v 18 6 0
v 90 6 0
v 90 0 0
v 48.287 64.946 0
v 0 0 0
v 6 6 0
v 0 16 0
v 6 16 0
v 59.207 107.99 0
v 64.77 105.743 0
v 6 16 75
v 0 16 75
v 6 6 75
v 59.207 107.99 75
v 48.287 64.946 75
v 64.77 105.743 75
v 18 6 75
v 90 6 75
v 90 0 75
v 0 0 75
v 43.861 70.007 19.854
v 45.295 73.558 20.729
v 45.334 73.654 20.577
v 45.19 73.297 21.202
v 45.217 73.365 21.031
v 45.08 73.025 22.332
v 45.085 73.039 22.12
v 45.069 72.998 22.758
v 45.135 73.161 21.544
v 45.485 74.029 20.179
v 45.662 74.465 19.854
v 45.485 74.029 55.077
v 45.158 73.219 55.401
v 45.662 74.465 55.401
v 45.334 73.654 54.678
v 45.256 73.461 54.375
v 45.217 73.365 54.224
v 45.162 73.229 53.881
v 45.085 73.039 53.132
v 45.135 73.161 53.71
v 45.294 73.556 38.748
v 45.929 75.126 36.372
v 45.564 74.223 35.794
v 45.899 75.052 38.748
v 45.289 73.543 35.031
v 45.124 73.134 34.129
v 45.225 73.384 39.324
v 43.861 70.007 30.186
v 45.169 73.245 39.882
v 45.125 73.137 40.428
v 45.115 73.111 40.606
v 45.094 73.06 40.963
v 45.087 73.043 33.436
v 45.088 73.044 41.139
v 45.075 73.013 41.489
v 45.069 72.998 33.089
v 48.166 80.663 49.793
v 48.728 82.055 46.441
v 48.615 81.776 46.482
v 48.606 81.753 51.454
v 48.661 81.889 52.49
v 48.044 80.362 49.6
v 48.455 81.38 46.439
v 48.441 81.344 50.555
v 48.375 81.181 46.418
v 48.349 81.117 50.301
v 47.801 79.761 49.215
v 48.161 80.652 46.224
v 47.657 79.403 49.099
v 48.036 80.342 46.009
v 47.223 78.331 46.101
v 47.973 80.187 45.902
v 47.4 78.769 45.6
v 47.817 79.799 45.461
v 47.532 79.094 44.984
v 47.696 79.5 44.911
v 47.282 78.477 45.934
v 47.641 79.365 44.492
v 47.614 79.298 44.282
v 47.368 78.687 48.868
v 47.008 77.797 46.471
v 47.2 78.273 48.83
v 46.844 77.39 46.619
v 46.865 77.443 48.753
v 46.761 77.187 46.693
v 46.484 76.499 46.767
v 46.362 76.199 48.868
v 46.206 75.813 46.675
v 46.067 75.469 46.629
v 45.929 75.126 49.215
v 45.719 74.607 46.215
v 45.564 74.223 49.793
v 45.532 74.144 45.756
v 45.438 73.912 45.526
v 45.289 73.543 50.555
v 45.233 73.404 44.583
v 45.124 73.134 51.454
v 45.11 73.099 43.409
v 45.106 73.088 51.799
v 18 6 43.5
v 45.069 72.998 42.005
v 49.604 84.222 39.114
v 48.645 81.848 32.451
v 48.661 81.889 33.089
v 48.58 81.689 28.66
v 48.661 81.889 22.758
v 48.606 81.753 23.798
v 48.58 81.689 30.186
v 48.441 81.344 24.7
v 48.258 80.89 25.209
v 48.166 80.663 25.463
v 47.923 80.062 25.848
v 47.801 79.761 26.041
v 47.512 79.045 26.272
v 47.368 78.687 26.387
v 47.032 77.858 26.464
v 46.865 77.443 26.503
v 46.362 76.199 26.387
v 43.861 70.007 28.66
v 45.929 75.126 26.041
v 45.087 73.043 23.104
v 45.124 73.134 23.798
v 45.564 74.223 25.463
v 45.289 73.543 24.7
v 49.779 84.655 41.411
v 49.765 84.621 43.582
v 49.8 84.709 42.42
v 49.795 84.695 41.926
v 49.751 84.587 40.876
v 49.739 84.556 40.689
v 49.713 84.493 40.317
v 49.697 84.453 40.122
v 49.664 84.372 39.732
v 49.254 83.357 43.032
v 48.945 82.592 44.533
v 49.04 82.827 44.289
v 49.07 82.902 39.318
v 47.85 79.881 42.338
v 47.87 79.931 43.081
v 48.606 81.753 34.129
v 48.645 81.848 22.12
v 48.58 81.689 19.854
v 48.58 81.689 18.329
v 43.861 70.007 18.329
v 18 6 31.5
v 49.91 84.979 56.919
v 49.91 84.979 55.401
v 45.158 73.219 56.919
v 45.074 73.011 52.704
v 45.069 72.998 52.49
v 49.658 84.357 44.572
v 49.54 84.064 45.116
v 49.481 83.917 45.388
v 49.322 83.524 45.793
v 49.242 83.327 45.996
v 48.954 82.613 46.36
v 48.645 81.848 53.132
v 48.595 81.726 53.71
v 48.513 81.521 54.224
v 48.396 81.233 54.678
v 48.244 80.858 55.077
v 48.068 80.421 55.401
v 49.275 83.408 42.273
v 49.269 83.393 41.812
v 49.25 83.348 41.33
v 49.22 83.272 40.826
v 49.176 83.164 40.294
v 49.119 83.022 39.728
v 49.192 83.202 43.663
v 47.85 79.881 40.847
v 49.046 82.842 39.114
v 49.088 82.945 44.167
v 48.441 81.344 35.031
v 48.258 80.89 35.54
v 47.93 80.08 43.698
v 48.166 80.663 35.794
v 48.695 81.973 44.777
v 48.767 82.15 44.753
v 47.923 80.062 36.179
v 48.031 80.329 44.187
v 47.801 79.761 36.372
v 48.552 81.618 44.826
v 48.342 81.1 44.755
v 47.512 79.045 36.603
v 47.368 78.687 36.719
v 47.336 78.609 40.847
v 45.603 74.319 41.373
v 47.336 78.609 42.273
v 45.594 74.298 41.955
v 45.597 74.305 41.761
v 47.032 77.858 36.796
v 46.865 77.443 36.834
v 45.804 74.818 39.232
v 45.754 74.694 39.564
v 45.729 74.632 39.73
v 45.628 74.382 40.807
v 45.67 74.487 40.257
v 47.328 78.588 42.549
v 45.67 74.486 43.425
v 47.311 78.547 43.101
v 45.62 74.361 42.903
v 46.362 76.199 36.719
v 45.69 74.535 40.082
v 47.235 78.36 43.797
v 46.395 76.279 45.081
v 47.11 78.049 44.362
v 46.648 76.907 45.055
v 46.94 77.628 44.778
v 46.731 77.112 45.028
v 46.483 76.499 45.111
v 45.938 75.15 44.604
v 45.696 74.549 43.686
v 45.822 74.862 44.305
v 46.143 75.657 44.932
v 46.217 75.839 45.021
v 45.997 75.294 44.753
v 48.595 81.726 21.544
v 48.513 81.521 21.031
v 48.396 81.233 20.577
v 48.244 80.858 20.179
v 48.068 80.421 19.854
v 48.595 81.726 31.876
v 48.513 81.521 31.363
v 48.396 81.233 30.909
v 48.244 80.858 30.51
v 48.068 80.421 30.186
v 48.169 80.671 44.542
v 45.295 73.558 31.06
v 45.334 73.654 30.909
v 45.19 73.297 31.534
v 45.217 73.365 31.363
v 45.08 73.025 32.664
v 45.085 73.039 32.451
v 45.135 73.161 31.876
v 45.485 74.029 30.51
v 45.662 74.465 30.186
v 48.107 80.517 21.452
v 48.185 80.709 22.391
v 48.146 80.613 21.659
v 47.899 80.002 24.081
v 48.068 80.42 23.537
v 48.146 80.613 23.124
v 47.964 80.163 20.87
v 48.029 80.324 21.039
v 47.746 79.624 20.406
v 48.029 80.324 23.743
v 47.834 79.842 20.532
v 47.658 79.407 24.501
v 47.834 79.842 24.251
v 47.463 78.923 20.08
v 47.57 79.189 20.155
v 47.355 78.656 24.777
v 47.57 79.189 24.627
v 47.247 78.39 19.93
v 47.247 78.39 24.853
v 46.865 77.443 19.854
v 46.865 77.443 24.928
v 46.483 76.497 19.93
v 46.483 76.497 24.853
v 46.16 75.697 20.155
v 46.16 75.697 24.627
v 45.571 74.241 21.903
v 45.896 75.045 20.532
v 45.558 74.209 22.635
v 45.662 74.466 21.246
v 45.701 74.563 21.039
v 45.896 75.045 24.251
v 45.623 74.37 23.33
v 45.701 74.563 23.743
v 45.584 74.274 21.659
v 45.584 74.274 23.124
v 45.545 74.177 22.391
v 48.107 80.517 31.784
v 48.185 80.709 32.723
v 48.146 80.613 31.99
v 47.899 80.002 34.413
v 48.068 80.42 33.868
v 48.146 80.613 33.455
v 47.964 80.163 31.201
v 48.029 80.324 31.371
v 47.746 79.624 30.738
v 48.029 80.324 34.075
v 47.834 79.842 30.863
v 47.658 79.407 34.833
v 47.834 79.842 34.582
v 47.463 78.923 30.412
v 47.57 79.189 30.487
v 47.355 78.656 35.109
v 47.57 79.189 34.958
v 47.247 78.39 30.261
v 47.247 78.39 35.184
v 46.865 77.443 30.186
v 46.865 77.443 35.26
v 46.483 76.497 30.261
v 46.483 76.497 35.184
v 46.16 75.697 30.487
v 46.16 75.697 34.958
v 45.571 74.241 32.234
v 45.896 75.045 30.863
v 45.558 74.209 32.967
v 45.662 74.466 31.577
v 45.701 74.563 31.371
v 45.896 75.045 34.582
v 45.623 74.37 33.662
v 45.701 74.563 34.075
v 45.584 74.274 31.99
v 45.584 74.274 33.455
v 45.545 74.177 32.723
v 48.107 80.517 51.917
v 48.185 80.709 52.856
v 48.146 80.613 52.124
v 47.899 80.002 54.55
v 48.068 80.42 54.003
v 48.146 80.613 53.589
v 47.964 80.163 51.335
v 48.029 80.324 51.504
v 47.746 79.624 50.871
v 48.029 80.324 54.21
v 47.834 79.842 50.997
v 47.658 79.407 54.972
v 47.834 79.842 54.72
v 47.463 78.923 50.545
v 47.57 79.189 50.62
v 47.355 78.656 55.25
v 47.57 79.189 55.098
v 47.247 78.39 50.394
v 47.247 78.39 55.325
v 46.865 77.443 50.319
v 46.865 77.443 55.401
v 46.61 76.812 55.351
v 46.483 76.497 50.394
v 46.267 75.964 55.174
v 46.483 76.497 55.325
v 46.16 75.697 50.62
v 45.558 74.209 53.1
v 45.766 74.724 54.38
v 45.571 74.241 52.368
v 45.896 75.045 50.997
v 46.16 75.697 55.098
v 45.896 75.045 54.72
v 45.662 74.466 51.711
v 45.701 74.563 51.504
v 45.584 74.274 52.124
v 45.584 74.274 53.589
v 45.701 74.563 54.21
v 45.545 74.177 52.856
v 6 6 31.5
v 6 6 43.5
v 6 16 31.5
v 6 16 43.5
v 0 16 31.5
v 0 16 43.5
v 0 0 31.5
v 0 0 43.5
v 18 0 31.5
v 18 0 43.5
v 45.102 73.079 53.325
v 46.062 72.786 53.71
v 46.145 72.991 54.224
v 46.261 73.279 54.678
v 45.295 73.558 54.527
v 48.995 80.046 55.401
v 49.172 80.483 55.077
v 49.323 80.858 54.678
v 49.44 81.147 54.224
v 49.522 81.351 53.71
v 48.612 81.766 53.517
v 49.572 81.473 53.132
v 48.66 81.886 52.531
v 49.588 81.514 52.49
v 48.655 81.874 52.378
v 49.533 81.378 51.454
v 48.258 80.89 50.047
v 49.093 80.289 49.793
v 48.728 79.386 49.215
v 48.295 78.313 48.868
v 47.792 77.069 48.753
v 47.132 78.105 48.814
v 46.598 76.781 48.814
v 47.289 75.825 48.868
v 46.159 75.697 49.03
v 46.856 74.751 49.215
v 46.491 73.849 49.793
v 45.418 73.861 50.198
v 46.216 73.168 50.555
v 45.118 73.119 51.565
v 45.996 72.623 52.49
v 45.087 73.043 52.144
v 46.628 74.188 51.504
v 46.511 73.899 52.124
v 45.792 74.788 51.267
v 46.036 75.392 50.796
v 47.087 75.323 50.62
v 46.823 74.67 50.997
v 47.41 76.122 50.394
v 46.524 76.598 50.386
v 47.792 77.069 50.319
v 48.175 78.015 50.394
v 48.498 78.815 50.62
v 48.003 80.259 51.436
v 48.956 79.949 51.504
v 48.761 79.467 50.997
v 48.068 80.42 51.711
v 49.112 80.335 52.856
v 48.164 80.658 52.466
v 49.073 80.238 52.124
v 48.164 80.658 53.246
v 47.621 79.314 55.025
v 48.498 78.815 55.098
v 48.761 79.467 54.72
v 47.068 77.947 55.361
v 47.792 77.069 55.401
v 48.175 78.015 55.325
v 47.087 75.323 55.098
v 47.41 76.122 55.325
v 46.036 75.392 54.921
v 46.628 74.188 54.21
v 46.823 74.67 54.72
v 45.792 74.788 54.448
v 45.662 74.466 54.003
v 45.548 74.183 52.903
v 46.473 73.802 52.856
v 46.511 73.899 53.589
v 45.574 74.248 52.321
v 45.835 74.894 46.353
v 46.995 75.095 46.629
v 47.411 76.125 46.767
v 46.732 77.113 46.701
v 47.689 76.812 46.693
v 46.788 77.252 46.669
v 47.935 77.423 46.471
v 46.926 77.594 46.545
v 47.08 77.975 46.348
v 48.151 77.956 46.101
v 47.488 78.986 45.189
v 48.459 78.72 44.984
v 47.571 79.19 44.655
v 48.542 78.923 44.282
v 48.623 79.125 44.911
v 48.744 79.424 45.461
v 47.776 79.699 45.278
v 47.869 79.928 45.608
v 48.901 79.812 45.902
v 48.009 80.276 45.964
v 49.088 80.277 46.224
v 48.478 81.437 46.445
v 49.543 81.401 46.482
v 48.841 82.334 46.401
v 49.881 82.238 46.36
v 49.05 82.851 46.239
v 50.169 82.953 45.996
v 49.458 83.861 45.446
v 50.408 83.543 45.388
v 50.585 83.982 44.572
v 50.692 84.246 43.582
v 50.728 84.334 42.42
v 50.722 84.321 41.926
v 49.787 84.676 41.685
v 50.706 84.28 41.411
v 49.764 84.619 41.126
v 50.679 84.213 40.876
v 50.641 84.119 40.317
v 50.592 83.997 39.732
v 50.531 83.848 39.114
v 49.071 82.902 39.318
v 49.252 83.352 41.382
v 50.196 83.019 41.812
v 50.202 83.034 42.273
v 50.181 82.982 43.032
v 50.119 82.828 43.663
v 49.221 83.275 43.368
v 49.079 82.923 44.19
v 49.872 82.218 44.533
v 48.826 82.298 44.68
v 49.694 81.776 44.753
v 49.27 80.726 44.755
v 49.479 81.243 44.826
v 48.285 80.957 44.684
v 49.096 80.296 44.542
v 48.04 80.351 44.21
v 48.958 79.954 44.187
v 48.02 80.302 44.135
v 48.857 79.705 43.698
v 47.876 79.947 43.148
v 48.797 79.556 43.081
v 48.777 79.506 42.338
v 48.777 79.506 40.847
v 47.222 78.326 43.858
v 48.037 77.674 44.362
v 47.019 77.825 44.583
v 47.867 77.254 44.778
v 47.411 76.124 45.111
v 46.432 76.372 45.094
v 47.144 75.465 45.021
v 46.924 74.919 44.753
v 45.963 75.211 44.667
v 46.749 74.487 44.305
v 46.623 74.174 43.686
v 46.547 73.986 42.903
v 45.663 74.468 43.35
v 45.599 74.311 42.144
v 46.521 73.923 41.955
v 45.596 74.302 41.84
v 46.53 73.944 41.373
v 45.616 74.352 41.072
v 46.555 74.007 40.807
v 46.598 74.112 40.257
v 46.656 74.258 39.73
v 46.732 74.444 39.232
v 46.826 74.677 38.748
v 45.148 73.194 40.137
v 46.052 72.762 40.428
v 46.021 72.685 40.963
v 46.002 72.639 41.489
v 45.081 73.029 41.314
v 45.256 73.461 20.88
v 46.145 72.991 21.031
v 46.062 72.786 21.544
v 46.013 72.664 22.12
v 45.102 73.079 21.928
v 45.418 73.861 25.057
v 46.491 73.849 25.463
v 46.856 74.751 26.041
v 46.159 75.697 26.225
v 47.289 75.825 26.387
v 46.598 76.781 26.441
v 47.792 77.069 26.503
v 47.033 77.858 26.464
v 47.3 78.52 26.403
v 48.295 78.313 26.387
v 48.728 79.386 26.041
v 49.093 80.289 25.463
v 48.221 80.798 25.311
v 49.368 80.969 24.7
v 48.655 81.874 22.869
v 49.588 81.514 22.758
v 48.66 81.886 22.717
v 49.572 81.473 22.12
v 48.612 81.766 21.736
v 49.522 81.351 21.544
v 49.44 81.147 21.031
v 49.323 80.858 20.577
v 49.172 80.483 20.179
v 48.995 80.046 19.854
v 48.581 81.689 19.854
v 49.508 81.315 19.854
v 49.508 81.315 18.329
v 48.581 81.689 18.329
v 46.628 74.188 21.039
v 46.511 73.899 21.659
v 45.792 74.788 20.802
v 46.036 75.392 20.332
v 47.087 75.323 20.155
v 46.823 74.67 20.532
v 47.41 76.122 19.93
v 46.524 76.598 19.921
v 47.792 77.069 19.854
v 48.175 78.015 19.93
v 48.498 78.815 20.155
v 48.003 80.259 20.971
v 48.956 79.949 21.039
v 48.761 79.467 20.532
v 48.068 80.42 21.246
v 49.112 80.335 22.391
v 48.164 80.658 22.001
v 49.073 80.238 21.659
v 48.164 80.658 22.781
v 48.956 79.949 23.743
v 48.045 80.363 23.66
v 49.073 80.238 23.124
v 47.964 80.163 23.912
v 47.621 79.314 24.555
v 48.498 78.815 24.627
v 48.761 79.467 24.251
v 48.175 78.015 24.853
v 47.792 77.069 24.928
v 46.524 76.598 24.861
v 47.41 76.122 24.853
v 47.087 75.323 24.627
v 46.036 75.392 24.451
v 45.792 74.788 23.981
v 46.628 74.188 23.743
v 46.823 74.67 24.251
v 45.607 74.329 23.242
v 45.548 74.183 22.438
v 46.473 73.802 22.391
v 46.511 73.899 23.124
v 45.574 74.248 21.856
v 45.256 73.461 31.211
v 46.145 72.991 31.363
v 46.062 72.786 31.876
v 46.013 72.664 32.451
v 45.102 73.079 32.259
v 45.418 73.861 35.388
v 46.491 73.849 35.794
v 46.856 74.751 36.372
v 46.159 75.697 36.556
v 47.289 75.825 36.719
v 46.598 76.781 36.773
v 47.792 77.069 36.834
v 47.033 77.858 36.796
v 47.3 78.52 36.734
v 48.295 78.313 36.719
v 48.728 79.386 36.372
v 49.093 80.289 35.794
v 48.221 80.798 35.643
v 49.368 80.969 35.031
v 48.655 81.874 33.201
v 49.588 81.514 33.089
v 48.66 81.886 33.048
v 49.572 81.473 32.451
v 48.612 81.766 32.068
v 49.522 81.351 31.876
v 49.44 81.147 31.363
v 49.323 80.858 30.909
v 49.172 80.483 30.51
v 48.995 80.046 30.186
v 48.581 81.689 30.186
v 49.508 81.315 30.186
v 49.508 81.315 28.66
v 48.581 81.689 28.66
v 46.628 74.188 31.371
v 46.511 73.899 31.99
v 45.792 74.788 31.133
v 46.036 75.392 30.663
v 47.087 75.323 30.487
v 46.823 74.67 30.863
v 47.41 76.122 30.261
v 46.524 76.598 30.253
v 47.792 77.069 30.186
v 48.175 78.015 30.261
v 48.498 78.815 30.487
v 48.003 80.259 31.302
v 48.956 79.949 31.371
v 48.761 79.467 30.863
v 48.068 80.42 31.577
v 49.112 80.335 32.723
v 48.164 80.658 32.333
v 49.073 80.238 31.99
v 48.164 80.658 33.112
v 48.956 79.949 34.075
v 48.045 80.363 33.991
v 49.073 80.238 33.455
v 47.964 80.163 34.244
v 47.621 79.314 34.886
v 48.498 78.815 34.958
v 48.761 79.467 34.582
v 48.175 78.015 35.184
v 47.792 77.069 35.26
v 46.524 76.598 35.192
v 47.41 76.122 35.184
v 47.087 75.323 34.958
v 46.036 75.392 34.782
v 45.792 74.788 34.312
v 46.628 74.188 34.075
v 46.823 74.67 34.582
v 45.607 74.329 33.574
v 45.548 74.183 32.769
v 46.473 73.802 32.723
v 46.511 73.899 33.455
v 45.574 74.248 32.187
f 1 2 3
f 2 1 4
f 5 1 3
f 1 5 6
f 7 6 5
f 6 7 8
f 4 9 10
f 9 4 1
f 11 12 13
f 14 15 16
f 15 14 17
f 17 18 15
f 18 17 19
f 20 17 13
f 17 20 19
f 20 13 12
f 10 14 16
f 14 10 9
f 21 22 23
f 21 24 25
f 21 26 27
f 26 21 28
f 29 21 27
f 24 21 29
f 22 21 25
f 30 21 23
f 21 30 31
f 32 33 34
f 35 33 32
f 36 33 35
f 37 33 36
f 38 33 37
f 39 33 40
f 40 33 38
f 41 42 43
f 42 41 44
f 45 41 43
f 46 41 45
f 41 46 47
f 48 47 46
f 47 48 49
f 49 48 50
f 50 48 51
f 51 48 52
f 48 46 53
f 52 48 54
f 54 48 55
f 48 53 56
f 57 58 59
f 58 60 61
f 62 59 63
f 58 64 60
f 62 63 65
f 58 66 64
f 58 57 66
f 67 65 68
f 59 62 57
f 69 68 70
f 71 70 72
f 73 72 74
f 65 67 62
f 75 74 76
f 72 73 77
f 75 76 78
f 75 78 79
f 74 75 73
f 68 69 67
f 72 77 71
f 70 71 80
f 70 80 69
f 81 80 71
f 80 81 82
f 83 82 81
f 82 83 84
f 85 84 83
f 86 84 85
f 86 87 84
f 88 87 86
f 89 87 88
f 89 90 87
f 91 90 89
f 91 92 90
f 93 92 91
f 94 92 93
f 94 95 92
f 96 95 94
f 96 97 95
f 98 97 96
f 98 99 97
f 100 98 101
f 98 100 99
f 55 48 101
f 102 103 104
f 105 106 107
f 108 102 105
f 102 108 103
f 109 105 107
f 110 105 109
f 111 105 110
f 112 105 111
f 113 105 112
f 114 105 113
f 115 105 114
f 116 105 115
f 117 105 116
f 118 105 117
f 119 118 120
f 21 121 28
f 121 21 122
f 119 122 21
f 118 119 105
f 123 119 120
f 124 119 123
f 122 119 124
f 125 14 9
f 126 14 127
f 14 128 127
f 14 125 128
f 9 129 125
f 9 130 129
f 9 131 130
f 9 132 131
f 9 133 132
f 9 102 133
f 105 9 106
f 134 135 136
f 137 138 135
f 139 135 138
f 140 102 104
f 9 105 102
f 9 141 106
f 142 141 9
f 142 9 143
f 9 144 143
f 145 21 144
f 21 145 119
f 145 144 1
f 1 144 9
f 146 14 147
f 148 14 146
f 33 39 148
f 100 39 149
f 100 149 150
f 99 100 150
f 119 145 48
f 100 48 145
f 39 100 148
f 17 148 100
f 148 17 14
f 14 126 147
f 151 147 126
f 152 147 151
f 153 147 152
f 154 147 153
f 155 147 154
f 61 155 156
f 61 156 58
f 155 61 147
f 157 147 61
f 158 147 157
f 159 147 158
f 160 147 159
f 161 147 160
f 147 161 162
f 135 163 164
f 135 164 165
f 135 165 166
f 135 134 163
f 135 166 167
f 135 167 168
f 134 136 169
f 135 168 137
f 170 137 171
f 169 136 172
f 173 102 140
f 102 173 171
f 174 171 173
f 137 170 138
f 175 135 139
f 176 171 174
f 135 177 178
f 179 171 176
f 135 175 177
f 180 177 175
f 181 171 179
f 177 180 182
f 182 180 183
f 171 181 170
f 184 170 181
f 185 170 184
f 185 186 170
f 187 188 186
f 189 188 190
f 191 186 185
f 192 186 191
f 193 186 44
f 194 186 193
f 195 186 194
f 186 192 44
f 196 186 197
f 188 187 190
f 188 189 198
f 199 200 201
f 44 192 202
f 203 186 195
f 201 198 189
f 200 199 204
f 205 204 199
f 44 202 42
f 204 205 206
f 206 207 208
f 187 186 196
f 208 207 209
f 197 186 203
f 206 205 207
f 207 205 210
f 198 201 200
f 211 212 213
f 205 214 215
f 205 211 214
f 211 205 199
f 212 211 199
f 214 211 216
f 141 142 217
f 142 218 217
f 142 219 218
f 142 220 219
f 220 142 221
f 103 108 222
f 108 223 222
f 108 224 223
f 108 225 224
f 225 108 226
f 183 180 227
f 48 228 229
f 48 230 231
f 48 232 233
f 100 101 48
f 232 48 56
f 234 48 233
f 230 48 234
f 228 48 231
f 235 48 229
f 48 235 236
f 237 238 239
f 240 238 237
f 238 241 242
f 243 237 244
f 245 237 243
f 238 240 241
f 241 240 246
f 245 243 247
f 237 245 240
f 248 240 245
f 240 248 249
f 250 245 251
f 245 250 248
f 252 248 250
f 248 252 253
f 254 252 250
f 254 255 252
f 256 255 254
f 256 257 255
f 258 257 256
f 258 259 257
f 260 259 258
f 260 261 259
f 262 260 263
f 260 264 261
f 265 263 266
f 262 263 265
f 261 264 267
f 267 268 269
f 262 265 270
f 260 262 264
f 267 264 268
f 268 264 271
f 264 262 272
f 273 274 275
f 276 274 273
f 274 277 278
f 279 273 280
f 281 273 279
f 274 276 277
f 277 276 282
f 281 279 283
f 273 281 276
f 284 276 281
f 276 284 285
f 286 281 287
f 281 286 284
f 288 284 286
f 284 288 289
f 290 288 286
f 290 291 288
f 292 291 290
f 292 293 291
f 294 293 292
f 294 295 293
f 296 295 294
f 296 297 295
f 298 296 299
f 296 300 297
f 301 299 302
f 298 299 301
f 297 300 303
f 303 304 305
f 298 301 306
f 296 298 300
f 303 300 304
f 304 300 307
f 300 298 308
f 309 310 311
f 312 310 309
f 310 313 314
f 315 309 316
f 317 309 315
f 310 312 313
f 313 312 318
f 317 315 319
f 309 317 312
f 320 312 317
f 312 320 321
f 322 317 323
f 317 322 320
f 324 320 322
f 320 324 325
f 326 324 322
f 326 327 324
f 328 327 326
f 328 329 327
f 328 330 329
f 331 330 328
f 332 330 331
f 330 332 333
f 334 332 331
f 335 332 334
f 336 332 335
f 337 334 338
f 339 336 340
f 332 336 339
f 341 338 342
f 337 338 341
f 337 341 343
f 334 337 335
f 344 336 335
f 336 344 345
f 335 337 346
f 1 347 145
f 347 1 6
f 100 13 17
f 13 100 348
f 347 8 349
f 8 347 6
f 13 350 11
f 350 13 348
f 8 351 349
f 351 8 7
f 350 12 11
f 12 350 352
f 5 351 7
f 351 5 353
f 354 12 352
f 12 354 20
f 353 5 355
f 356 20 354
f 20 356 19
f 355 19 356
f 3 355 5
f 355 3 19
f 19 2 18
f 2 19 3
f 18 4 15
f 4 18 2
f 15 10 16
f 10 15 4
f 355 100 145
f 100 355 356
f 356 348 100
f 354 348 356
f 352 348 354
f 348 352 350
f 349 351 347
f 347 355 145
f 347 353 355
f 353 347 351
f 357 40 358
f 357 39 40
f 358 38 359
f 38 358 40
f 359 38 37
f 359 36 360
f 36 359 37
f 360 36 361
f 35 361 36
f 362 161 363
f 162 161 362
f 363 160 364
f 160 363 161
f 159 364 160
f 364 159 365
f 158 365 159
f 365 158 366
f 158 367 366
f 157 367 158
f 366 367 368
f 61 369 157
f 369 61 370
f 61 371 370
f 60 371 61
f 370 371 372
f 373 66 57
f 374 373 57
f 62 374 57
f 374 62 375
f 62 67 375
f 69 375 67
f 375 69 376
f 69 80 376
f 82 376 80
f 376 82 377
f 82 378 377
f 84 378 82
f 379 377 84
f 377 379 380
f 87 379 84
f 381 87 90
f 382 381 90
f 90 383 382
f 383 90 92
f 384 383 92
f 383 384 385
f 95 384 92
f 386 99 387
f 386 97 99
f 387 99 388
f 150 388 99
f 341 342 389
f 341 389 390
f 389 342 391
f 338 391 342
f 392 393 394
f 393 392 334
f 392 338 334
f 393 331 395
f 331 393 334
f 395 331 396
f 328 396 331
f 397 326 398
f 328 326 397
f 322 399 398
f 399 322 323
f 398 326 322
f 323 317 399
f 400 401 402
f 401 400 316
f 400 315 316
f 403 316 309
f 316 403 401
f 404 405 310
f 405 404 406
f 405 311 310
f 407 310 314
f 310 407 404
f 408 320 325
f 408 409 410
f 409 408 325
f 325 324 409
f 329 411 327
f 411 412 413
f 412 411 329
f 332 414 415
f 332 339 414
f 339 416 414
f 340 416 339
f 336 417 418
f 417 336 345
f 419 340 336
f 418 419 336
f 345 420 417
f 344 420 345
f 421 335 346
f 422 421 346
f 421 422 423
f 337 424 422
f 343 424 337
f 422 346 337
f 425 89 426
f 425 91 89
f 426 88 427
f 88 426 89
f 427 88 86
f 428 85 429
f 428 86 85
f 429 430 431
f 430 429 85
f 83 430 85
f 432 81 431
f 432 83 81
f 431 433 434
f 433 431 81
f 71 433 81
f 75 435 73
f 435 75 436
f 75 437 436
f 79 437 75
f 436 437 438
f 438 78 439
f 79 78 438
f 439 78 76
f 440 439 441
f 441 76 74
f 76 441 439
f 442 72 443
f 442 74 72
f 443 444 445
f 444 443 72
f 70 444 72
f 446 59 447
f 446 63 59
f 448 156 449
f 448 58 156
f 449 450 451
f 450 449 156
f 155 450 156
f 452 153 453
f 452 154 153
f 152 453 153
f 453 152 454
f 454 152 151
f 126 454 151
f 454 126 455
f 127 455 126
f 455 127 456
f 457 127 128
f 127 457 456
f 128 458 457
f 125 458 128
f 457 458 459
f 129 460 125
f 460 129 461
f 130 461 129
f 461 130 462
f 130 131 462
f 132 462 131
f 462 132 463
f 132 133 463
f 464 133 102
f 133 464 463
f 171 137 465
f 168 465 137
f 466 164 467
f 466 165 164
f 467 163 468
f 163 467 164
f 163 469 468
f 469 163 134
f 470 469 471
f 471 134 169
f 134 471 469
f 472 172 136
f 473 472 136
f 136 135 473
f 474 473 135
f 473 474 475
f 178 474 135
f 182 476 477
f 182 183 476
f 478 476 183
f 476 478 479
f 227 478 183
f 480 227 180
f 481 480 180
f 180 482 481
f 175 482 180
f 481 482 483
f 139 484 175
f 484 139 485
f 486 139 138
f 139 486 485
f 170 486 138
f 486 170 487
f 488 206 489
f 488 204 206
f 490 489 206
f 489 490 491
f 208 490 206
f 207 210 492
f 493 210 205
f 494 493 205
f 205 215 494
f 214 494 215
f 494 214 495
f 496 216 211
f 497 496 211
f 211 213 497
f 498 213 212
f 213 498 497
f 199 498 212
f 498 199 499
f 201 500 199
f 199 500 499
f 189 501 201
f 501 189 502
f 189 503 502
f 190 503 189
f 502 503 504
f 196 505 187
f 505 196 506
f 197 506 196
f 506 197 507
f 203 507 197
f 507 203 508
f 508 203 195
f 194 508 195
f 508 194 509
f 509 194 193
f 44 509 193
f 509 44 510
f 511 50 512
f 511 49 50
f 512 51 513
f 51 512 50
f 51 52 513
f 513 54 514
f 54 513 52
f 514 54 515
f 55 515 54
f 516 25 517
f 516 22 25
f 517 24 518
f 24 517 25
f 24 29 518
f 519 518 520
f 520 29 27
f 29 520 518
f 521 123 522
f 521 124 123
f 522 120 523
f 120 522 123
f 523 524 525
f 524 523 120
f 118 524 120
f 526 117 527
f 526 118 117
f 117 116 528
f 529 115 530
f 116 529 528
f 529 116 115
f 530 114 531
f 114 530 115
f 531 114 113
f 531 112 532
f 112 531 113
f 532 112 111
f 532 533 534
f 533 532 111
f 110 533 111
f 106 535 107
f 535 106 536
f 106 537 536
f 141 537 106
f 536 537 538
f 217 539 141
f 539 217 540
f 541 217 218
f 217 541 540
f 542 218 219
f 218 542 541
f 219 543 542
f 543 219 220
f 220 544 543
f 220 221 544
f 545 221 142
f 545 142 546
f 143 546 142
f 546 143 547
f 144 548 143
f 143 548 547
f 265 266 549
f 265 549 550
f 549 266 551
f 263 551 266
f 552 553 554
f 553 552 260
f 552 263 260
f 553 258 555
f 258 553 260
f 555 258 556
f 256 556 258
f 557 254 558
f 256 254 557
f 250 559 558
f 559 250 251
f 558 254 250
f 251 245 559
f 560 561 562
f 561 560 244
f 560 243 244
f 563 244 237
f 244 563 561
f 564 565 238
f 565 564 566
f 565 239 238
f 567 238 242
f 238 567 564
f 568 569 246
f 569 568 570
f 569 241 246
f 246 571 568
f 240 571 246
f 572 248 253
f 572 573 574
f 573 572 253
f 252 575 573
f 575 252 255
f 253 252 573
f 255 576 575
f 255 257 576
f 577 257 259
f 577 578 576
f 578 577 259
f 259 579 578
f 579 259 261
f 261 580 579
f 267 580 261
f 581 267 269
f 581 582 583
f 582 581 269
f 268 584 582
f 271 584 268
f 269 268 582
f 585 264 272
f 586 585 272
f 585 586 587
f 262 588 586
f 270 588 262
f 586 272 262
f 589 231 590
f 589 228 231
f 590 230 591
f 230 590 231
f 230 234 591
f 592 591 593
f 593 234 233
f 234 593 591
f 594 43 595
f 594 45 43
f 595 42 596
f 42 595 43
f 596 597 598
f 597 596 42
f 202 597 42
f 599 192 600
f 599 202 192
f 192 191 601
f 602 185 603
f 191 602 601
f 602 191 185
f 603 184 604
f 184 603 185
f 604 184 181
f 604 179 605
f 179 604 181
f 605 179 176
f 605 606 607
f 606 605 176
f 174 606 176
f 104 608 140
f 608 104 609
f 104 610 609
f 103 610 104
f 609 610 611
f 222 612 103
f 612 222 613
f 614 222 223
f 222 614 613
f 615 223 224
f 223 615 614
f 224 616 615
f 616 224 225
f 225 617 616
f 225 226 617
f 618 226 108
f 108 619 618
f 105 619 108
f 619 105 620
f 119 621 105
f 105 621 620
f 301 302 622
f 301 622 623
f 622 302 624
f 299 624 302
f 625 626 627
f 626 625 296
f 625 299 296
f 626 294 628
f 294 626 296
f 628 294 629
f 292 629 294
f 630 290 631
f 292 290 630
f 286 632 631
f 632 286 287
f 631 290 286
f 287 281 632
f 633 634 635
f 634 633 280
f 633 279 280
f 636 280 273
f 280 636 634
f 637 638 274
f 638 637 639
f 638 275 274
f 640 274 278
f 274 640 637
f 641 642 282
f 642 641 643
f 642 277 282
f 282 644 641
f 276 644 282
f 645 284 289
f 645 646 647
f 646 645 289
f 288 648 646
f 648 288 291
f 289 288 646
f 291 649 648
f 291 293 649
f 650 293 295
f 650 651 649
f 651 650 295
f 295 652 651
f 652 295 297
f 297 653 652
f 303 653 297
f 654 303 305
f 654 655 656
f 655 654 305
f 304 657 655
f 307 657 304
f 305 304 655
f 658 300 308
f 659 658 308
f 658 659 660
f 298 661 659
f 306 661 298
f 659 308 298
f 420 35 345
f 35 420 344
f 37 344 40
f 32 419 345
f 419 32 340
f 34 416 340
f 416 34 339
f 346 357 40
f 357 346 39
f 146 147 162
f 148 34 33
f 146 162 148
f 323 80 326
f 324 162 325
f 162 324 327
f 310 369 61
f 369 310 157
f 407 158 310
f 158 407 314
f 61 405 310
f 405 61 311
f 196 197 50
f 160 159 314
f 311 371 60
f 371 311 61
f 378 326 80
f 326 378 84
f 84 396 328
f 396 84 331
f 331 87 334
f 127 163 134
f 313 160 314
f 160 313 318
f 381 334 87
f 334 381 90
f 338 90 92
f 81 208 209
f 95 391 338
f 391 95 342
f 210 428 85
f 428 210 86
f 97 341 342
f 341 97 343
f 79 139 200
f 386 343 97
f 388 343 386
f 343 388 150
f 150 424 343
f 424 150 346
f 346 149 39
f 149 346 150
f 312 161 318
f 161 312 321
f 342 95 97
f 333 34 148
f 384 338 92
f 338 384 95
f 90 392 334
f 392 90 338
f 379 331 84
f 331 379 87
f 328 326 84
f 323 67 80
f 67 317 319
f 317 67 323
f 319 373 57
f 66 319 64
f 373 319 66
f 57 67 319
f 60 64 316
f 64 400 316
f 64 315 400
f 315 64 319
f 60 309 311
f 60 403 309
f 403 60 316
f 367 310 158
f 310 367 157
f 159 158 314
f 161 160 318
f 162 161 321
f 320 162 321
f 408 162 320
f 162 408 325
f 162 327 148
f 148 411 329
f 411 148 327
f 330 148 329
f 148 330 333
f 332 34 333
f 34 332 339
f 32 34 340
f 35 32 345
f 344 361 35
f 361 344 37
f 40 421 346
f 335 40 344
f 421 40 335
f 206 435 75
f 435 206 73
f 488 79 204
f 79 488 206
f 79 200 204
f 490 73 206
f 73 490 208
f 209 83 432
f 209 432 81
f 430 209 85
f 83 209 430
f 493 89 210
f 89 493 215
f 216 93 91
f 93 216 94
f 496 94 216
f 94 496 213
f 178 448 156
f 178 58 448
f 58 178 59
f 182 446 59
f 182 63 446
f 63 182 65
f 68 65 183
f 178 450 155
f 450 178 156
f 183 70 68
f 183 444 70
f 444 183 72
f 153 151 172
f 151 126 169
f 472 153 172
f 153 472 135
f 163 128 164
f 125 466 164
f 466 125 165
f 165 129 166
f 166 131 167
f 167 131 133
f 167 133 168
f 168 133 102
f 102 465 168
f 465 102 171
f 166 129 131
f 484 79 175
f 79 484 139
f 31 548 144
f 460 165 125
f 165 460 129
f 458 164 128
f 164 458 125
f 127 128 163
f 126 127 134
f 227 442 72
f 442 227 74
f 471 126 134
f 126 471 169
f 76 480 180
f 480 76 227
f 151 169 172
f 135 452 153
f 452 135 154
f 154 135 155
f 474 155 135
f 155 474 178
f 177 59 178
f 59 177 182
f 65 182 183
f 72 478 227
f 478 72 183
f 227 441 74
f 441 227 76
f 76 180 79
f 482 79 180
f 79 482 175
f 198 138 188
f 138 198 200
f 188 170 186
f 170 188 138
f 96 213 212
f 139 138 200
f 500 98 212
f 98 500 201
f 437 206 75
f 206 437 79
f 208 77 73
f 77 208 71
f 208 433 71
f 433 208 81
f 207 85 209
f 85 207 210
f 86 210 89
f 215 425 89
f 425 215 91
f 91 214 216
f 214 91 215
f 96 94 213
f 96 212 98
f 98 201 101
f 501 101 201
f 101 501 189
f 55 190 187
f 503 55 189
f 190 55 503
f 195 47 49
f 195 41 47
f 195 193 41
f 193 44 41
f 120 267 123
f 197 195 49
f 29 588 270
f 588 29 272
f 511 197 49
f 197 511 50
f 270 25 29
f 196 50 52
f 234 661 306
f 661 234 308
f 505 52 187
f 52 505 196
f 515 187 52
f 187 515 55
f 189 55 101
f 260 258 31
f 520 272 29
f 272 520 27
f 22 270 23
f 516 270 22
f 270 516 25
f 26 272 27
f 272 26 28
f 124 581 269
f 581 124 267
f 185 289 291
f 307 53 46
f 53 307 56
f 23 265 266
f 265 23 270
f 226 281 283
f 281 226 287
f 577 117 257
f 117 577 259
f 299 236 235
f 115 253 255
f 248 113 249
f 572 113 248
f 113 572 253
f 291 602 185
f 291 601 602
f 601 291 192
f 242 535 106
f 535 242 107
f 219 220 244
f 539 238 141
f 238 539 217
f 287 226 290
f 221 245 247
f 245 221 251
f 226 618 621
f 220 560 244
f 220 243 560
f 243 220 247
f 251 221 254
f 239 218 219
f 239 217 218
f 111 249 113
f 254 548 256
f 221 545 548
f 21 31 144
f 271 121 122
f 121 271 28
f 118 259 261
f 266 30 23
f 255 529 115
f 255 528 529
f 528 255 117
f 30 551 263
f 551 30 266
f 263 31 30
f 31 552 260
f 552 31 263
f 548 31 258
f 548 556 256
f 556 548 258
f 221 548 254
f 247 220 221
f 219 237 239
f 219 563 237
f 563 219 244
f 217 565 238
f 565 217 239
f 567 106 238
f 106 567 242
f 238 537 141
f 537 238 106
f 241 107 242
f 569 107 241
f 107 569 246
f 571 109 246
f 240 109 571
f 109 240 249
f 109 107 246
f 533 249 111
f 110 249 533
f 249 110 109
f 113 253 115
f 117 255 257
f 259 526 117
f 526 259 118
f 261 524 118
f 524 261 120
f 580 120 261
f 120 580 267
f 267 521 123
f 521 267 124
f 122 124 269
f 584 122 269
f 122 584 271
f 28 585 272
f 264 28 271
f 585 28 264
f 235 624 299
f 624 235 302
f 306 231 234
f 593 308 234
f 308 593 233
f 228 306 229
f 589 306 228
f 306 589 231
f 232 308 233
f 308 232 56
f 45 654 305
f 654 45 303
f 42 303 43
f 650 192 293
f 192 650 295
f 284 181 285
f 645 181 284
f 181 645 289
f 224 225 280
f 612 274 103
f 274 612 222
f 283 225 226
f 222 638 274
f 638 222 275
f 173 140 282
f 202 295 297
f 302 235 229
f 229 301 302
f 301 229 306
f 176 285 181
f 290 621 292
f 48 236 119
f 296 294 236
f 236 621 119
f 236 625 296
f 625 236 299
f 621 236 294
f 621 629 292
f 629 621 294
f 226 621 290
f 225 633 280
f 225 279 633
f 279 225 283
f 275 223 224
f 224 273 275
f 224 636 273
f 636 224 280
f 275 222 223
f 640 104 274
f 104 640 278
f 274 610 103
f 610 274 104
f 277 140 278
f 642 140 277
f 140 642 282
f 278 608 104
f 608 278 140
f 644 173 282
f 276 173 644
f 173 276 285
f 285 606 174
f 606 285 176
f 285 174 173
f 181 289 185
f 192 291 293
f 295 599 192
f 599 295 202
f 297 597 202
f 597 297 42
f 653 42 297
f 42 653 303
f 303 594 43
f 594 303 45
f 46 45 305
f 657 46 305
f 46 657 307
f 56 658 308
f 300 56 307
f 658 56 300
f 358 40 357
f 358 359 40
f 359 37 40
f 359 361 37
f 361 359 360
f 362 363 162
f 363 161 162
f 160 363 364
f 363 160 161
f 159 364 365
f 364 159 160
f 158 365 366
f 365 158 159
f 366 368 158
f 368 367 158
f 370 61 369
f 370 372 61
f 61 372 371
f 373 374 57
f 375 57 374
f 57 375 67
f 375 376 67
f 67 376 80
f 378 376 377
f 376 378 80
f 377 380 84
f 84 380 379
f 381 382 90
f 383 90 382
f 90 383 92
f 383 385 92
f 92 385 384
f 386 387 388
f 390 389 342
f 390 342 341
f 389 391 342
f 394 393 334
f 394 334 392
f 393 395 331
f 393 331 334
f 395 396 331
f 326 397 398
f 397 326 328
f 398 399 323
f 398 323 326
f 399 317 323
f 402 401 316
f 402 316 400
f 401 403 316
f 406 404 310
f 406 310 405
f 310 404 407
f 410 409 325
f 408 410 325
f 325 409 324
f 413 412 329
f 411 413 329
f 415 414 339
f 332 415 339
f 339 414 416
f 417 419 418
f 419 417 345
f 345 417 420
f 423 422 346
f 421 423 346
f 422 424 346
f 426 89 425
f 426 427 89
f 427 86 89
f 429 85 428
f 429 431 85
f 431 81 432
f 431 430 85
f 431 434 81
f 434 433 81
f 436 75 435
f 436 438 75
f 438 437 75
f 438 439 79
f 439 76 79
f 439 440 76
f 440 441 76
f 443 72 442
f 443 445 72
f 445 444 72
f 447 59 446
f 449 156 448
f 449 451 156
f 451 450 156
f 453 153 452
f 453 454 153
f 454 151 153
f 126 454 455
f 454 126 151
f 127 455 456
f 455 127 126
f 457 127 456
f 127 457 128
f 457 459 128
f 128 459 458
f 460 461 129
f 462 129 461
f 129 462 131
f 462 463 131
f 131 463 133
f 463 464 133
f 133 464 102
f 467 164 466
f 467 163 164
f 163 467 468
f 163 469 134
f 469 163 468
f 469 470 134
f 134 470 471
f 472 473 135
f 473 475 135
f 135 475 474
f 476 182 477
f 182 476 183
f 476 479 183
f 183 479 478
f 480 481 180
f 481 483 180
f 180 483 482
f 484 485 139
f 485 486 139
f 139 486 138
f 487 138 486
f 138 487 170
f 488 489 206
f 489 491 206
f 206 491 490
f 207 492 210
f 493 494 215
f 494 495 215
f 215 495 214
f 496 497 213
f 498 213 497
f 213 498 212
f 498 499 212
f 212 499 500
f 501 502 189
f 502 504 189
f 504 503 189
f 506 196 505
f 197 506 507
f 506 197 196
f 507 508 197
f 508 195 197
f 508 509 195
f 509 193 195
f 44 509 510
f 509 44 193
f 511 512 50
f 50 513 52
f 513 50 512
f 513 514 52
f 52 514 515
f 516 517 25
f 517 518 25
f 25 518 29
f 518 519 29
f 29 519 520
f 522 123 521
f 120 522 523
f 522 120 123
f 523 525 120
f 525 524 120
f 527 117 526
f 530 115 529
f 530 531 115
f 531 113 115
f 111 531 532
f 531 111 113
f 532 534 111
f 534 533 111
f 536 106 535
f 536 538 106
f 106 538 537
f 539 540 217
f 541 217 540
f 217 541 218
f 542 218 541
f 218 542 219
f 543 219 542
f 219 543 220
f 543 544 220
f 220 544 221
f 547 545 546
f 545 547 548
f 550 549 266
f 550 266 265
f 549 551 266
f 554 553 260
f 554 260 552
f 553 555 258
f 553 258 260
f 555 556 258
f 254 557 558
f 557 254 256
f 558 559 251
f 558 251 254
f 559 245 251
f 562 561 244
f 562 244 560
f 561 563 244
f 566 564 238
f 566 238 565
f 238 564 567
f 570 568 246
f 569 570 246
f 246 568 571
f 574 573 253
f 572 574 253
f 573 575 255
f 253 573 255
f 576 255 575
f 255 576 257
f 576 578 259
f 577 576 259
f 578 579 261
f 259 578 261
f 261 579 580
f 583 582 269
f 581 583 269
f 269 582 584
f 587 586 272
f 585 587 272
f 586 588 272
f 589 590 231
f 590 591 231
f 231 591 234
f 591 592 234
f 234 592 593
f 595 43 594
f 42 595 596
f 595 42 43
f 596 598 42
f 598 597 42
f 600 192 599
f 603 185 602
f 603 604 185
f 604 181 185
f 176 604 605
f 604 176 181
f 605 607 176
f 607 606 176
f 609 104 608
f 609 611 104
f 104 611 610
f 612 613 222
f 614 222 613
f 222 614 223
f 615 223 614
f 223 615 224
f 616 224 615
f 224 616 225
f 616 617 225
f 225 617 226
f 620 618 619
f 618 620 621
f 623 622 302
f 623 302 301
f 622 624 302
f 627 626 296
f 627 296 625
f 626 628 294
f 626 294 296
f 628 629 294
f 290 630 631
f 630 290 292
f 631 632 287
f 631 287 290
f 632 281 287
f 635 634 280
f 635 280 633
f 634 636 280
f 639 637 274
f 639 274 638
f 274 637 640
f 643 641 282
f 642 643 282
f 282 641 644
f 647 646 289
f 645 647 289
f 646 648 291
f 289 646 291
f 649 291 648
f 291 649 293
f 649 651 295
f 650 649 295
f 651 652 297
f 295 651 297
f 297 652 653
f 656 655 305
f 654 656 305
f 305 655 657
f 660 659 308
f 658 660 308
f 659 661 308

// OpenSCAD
// ── SUPORTE DE TELEMÓVEL DE SECRETÁRIA — PERSONALIZADO (texto/imagem à face, 3MF) ──
//
// Suporte clássico para pousar na mesa: base, lábio à frente, ranhura para o telemóvel, encosto
// inclinado para trás e reforço por trás. O perfil (vista de lado) está em XY — x para trás a
// partir da frente, y para cima — e é extrudido pela largura em z: sai deitado de lado, que é como
// se imprime (sem suportes).
//
// Texto ou imagem embutidos À FACE, noutra cor, na frente do encosto (zona "encosto") e/ou na
// frente do lábio (zona "labio"). Sai em 3MF (generation_schema.multicor); o template corre uma
// vez por parte (modo):
//   "corpo"                  suporte com os rebaixos
//   "encosto" / "labio"      enchimento de cada zona (rente à face)
//   "encosto_solta" / "labio_solta"  sem AMS: o enchimento deitado na mesa, um pouco mais pequeno
//                            (folga_embutido) para imprimir noutra cor e colar no rebaixo
// (sem modo: tudo, com cores — só para ver no OpenSCAD).
// Do servidor: esc_texto_encosto / esc_texto_labio (lib/textFit.js) e encosto_pts / encosto_paths
//   / tem_encosto, labio_pts / labio_paths / tem_labio (lib/logo.js).
// Se mudares as fórmulas, muda também Maker_Pro_Frontend_Prod/lib/suportesTelemovelExtra.ts.

function _b(v, d) = is_undef(v) ? d : (v == true || v == 1 || v == "true");
function _W()   = is_undef(largura) ? 75 : largura;
function _a()   = is_undef(angulo) ? 22 : angulo;
function _Le()  = is_undef(altura_encosto) ? 110 : altura_encosto;
function _e()   = is_undef(espessura) ? 6 : espessura;
function _g()   = is_undef(espessura_telemovel) ? 12 : espessura_telemovel;
function _hl()  = max(_e() + 3, is_undef(altura_labio) ? 16 : altura_labio);
function _ref() = is_undef(reforco) ? "Inteiro" : reforco;
function _rc()  = _b(is_undef(ranhura_cabo) ? undef : ranhura_cabo, true);
function _wr()  = is_undef(largura_ranhura) ? 12 : largura_ranhura;

function _x0() = _e() + _g();                                        // frente do encosto, junto à base
function _V()  = [sin(_a()), cos(_a())];                             // ao longo do encosto, para cima
function _Nb() = [cos(_a()), -sin(_a())];                            // normal de trás do encosto
function _F0() = [_x0(), _e()];
function _Pk() = _F0() + 0.6 * _Le() * _V() + _e() * _Nb();          // onde o reforço toca no encosto
function _Lb() = max(is_undef(profundidade_base) ? 90 : profundidade_base,
                     _x0() + 0.75 * _Le() * sin(_a()) + _e() * cos(_a()) + _e(), _Pk()[0] + _e());

module perfil() {
    e = _e(); Lb = _Lb(); F0 = _F0(); V = _V(); Nb = _Nb(); Le = _Le();
    square([Lb, e]);                                                 // base
    square([e, _hl()]);                                              // lábio
    polygon([F0, F0 + Le * V, F0 + Le * V + e * Nb, F0 + e * Nb]);   // encosto
    if (_ref() == "Inteiro") polygon([F0, _Pk(), [Lb, e]]);
    else if (_ref() == "Barra") {
        Q = [Lb - 0.75 * e, e / 2]; d = (Q - _Pk()) / norm(Q - _Pk()); np = [-d[1], d[0]];
        polygon([_Pk() + e / 2 * np, Q + e / 2 * np, Q - e / 2 * np, _Pk() - e / 2 * np]);
    }
}

module suporte() {
    W = _W();
    difference() {
        linear_extrude(height = W) perfil();
        if (_rc())                                                   // ranhura do cabo (pelo lábio e pelo fundo)
            translate([-1, -1, (W - _wr()) / 2]) cube([_x0() + 1, _hl() + 2, _wr()]);
    }
}

// ══ personalização: texto/imagem à face ══
MARG = 4;                                                            // margem às arestas da largura (mm)
MV = 1;                                                              // margem às arestas em altura (mm)
function _modo()  = is_undef(modo) ? "tudo" : modo;
function _fonte() = is_undef(fonte) ? "Open Sans" : fonte;
function _dp()    = max(0.4, min(is_undef(profundidade_embutido) ? 1 : profundidade_embutido, _e() - 1.5));
function _conteudo(z) = z == "encosto" ? (is_undef(conteudo_encosto) ? "Texto" : conteudo_encosto)
                                       : (is_undef(conteudo_labio) ? "Nada" : conteudo_labio);
function _texto(z) = z == "encosto" ? (is_undef(texto_encosto) ? "pp3d" : texto_encosto) : (is_undef(texto_labio) ? "" : texto_labio);
function _tam(z)   = z == "encosto" ? (is_undef(tamanho_texto_encosto) ? 12 : tamanho_texto_encosto) : (is_undef(tamanho_texto_labio) ? 8 : tamanho_texto_labio);
function _esc(z)   = let(v = z == "encosto" ? (is_undef(esc_texto_encosto) ? 1 : esc_texto_encosto) : (is_undef(esc_texto_labio) ? 1 : esc_texto_labio)) max(0.05, min(1, v));
function _tem_img(z) = z == "encosto" ? (!is_undef(tem_encosto) && tem_encosto == true && !is_undef(encosto_pts) && len(encosto_pts) >= 3)
                                      : (!is_undef(tem_labio) && tem_labio == true && !is_undef(labio_pts) && len(labio_pts) >= 3);
function _ativa(z) = _conteudo(z) == "Texto" ? len(_texto(z)) > 0 : _conteudo(z) == "Imagem" ? _tem_img(z) : false;

function _sc() = _Le() * max(0, min(100, is_undef(posicao_encosto) ? 70 : posicao_encosto)) / 100;
// face → peça: (u, v, w), u = leitura, v = para cima, w para fora da face (rotação própria)
function _M(z) = let(a = _a(), c = cos(a), s = sin(a), W = _W())
    z == "encosto"
    ? let(O = _F0() + _sc() * _V()) [[0, s, -c, O[0]], [0, c, s, O[1]], [1, 0, 0, W / 2], [0, 0, 0, 1]]
    : [[0, 0, -1, 0], [0, 1, 0, _hl() / 2], [1, 0, 0, W / 2], [0, 0, 0, 1]];

// região útil de cada zona, no plano da face (u, v)
module zona(z) {
    W = _W();
    if (z == "encosto")
        translate([-(W / 2 - MARG), MV - _sc()]) square([W - 2 * MARG, _Le() - 2 * MV]);
    else difference() {
        translate([-(W / 2 - MARG), -(_hl() / 2 - MV)]) square([W - 2 * MARG, _hl() - 2 * MV]);
        if (_rc()) translate([-_wr() / 2 - 1, -_hl()]) square([_wr() + 2, 2 * _hl()]);
    }
}

module conteudo2d(z) {
    intersection() {
        zona(z);
        if (_conteudo(z) == "Texto")
            scale(_esc(z)) offset(delta = 0.01)
                text(_texto(z), size = _tam(z), font = _fonte(), halign = "center", valign = "center", $fn = 16);
        else if (_conteudo(z) == "Imagem" && _tem_img(z)) {
            if (z == "encosto") polygon(points = encosto_pts, paths = encosto_paths);
            else polygon(points = labio_pts, paths = labio_paths);
        }
    }
}
module na_face(z, w0, w1) { multmatrix(_M(z)) translate([0, 0, w0]) linear_extrude(height = w1 - w0) conteudo2d(z); }
module enchimento(z) { if (_ativa(z)) na_face(z, -_dp(), 0); }

function _fe() = max(0, min(0.5, is_undef(folga_embutido) ? 0.15 : folga_embutido));
module solta(z) { if (_ativa(z)) linear_extrude(height = _dp()) offset(delta = -_fe()) conteudo2d(z); }

module corpo() {
    difference() {
        suporte();
        for (z = ["encosto", "labio"]) if (_ativa(z)) na_face(z, -_dp(), 0.5);
    }
}

if (_modo() == "corpo") corpo();
else if (_modo() == "encosto") enchimento("encosto");
else if (_modo() == "labio") enchimento("labio");
else if (_modo() == "encosto_solta") solta("encosto");
else if (_modo() == "labio_solta") solta("labio");
else {
    color(is_undef(cor_suporte) ? "#111111" : cor_suporte) corpo();
    color(is_undef(cor_encosto) ? "#FFFFFF" : cor_encosto) enchimento("encosto");
    color(is_undef(cor_labio) ? "#FFFFFF" : cor_labio) enchimento("labio");
}
